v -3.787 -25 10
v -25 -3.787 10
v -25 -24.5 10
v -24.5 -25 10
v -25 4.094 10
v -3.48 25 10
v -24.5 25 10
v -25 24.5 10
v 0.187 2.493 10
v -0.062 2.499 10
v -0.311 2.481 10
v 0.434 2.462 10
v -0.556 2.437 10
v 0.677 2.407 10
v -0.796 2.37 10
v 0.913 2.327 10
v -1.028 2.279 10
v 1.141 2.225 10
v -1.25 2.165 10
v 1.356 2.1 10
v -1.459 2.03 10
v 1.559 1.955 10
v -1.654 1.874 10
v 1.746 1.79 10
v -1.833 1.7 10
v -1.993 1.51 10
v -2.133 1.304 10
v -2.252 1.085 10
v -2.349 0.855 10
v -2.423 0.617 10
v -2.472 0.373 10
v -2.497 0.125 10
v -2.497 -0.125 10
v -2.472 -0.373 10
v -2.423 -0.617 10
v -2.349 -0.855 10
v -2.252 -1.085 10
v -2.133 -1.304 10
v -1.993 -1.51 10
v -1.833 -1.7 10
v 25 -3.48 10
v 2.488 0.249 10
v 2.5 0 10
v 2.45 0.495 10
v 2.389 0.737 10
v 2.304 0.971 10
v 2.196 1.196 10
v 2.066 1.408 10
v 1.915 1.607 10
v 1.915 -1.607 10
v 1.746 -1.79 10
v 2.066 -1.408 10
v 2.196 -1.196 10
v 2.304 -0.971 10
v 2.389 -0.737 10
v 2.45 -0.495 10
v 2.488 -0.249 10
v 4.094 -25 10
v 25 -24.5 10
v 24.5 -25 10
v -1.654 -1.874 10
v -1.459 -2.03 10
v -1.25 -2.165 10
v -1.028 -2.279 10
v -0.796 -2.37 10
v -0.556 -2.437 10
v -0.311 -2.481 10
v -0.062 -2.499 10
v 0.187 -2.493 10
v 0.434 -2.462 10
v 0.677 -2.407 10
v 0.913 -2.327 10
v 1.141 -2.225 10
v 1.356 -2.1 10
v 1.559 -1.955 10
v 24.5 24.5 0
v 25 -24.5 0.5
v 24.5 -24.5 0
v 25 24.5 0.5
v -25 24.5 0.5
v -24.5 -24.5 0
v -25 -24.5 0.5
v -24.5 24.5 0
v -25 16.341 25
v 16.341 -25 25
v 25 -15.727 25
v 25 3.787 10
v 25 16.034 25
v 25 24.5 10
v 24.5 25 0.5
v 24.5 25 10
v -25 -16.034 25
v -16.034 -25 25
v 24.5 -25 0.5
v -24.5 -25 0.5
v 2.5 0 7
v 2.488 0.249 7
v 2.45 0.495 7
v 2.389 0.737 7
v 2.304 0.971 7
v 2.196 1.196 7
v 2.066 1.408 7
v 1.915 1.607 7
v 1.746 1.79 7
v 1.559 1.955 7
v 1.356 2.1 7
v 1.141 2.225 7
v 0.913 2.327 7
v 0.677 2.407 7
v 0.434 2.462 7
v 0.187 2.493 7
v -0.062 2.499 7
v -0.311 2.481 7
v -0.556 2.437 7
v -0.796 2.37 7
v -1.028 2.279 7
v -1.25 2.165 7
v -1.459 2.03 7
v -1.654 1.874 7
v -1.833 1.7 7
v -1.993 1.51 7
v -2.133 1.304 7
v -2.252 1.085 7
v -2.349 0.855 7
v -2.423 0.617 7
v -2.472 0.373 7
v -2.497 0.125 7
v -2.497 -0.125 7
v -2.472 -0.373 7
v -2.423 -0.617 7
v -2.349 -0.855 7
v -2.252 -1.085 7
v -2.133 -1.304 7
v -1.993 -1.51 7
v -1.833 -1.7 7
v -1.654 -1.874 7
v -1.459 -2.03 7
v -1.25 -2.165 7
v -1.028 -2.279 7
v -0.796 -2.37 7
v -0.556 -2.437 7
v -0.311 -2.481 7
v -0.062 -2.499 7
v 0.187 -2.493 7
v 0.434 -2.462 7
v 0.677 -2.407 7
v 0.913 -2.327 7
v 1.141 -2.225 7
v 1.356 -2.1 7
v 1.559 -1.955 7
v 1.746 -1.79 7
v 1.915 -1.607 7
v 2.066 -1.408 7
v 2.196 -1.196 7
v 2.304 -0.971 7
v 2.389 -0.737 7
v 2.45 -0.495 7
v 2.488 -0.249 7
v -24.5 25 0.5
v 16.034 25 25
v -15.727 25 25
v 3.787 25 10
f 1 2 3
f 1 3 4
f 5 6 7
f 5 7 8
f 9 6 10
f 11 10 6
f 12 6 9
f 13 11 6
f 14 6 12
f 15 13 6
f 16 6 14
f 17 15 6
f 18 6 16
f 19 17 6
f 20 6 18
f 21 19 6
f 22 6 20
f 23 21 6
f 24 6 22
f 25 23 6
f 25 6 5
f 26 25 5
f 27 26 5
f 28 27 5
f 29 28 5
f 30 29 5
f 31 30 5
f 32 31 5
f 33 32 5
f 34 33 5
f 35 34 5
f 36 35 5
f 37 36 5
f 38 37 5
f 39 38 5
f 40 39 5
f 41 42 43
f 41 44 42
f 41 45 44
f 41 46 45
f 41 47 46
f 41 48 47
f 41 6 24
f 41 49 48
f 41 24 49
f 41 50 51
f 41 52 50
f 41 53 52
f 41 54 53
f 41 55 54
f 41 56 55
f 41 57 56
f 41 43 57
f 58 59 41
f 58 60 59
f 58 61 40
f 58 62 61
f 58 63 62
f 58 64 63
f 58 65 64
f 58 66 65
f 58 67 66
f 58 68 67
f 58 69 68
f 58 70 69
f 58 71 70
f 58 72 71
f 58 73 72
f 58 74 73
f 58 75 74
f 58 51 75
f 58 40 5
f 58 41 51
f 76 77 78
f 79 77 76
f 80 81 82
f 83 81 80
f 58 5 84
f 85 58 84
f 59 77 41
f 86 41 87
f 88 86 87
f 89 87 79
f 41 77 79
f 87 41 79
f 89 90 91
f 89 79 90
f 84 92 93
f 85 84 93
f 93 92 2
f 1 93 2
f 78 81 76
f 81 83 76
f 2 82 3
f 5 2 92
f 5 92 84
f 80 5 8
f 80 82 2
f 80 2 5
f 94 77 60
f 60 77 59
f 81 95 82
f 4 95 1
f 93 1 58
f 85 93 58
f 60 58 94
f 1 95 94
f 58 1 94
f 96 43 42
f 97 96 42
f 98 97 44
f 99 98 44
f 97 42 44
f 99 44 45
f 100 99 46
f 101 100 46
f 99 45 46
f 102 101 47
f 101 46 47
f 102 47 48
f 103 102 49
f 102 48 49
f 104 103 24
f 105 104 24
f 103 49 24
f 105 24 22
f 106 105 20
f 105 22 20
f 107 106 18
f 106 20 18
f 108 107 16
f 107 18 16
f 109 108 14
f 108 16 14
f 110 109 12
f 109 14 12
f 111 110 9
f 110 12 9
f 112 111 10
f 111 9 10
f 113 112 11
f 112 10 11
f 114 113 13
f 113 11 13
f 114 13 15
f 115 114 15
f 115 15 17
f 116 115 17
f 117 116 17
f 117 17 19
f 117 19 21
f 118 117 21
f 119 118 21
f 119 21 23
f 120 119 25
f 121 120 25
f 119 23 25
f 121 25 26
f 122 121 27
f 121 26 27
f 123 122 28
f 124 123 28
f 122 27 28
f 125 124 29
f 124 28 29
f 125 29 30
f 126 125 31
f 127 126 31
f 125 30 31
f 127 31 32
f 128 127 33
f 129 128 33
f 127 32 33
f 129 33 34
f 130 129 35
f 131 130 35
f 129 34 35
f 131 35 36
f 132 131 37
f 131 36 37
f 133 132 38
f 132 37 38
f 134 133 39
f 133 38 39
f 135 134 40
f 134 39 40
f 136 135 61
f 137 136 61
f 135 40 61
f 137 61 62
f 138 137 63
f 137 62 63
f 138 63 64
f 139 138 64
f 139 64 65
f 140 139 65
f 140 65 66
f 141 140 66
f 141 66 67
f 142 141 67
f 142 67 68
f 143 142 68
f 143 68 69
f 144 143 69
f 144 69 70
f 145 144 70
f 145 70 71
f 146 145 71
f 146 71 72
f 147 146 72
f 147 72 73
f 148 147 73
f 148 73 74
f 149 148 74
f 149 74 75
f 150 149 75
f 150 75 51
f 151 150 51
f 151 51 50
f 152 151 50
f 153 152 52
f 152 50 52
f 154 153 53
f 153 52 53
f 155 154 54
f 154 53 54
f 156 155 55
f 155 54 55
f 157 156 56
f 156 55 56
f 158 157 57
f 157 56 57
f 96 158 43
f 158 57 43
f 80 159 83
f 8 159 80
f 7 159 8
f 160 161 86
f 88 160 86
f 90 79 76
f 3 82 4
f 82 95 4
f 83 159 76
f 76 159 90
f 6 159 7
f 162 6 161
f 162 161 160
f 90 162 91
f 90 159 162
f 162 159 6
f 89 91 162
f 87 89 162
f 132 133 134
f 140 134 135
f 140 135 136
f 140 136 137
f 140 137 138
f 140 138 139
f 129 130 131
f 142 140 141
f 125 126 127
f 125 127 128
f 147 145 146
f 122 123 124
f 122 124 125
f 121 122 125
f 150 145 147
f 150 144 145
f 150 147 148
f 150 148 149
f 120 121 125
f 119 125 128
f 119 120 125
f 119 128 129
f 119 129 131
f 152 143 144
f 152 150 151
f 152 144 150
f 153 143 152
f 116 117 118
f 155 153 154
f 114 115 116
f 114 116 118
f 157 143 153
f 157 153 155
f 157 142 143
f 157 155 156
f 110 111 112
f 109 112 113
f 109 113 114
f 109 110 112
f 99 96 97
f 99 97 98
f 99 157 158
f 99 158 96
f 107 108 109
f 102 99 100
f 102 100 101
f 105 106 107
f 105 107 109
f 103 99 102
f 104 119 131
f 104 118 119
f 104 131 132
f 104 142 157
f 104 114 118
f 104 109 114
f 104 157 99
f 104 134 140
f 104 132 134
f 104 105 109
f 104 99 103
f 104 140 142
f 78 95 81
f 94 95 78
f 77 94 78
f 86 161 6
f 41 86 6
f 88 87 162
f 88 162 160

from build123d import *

# Parameters (mm, degrees)
F0_W      = 50
F0_H      = 50
F1_DEPTH  = 25
F4_DEPTH  = 70.711678
F5_W      = 50
F5_H      = 50
F6_DEPTH  = 25
F9_SIZE   = 0.5
F11_R     = 2.5
F12_DEPTH = 3


with BuildPart() as f1:
    # F0 (on Top) → F1 (new body)
    with BuildSketch(Plane.XY):
        Rectangle(F0_W, F0_H)
    extrude(amount=F1_DEPTH)

    # F3 (on face) → F4 (cut, through all)
    with BuildSketch(Plane(origin=(25, -25, 0), x_dir=(-0.707107, -0.707107, 0), z_dir=(-0.707107, 0.707107, 0))):
        Polygon((35.355339, 25), (29.015593, 25), (20.355339, 10), (35.355339, 10), align=None)
        Polygon((-20.355339, 10), (-29.015593, 25), (-35.355339, 25), (-35.355339, 10), align=None)
        Polygon((6.122772, 25), (0, 25), (-6.55672, 25), (-15.216974, 10), (14.783026, 10), align=None)
    extrude(amount=F4_DEPTH, mode=Mode.SUBTRACT)

    # F9
    f9_edges = [f1.edges().sort_by_distance(p)[0] for p in [
        (-25, 25, 5),
        (25, 25, 5),
        (25, -25, 5),
        (-25, -25, 5),
        (0, -25, 0),
        (25, 0, 0),
        (0, 25, 0),
        (-25, 0, 0),
    ]]
    chamfer(f9_edges, length=F9_SIZE)

    # F11 (on face) → F12 (cut)
    with BuildSketch(Plane.XY.offset(10)):
        Circle(F11_R)
    extrude(amount=-F12_DEPTH, mode=Mode.SUBTRACT)


with BuildPart() as f6:
    # F5 (on face) → F6 (new body)
    with BuildSketch(Plane.XY.offset(10)):
        Rectangle(F5_W, F5_H)
    extrude(amount=F6_DEPTH)

    # F7: cut F1
    add(f1.part, mode=Mode.SUBTRACT)


with BuildPart() as f6_1:
    # F8: moved
    add(f6.part.moved(Location((55, 0, 0))))


solid = f1.part
